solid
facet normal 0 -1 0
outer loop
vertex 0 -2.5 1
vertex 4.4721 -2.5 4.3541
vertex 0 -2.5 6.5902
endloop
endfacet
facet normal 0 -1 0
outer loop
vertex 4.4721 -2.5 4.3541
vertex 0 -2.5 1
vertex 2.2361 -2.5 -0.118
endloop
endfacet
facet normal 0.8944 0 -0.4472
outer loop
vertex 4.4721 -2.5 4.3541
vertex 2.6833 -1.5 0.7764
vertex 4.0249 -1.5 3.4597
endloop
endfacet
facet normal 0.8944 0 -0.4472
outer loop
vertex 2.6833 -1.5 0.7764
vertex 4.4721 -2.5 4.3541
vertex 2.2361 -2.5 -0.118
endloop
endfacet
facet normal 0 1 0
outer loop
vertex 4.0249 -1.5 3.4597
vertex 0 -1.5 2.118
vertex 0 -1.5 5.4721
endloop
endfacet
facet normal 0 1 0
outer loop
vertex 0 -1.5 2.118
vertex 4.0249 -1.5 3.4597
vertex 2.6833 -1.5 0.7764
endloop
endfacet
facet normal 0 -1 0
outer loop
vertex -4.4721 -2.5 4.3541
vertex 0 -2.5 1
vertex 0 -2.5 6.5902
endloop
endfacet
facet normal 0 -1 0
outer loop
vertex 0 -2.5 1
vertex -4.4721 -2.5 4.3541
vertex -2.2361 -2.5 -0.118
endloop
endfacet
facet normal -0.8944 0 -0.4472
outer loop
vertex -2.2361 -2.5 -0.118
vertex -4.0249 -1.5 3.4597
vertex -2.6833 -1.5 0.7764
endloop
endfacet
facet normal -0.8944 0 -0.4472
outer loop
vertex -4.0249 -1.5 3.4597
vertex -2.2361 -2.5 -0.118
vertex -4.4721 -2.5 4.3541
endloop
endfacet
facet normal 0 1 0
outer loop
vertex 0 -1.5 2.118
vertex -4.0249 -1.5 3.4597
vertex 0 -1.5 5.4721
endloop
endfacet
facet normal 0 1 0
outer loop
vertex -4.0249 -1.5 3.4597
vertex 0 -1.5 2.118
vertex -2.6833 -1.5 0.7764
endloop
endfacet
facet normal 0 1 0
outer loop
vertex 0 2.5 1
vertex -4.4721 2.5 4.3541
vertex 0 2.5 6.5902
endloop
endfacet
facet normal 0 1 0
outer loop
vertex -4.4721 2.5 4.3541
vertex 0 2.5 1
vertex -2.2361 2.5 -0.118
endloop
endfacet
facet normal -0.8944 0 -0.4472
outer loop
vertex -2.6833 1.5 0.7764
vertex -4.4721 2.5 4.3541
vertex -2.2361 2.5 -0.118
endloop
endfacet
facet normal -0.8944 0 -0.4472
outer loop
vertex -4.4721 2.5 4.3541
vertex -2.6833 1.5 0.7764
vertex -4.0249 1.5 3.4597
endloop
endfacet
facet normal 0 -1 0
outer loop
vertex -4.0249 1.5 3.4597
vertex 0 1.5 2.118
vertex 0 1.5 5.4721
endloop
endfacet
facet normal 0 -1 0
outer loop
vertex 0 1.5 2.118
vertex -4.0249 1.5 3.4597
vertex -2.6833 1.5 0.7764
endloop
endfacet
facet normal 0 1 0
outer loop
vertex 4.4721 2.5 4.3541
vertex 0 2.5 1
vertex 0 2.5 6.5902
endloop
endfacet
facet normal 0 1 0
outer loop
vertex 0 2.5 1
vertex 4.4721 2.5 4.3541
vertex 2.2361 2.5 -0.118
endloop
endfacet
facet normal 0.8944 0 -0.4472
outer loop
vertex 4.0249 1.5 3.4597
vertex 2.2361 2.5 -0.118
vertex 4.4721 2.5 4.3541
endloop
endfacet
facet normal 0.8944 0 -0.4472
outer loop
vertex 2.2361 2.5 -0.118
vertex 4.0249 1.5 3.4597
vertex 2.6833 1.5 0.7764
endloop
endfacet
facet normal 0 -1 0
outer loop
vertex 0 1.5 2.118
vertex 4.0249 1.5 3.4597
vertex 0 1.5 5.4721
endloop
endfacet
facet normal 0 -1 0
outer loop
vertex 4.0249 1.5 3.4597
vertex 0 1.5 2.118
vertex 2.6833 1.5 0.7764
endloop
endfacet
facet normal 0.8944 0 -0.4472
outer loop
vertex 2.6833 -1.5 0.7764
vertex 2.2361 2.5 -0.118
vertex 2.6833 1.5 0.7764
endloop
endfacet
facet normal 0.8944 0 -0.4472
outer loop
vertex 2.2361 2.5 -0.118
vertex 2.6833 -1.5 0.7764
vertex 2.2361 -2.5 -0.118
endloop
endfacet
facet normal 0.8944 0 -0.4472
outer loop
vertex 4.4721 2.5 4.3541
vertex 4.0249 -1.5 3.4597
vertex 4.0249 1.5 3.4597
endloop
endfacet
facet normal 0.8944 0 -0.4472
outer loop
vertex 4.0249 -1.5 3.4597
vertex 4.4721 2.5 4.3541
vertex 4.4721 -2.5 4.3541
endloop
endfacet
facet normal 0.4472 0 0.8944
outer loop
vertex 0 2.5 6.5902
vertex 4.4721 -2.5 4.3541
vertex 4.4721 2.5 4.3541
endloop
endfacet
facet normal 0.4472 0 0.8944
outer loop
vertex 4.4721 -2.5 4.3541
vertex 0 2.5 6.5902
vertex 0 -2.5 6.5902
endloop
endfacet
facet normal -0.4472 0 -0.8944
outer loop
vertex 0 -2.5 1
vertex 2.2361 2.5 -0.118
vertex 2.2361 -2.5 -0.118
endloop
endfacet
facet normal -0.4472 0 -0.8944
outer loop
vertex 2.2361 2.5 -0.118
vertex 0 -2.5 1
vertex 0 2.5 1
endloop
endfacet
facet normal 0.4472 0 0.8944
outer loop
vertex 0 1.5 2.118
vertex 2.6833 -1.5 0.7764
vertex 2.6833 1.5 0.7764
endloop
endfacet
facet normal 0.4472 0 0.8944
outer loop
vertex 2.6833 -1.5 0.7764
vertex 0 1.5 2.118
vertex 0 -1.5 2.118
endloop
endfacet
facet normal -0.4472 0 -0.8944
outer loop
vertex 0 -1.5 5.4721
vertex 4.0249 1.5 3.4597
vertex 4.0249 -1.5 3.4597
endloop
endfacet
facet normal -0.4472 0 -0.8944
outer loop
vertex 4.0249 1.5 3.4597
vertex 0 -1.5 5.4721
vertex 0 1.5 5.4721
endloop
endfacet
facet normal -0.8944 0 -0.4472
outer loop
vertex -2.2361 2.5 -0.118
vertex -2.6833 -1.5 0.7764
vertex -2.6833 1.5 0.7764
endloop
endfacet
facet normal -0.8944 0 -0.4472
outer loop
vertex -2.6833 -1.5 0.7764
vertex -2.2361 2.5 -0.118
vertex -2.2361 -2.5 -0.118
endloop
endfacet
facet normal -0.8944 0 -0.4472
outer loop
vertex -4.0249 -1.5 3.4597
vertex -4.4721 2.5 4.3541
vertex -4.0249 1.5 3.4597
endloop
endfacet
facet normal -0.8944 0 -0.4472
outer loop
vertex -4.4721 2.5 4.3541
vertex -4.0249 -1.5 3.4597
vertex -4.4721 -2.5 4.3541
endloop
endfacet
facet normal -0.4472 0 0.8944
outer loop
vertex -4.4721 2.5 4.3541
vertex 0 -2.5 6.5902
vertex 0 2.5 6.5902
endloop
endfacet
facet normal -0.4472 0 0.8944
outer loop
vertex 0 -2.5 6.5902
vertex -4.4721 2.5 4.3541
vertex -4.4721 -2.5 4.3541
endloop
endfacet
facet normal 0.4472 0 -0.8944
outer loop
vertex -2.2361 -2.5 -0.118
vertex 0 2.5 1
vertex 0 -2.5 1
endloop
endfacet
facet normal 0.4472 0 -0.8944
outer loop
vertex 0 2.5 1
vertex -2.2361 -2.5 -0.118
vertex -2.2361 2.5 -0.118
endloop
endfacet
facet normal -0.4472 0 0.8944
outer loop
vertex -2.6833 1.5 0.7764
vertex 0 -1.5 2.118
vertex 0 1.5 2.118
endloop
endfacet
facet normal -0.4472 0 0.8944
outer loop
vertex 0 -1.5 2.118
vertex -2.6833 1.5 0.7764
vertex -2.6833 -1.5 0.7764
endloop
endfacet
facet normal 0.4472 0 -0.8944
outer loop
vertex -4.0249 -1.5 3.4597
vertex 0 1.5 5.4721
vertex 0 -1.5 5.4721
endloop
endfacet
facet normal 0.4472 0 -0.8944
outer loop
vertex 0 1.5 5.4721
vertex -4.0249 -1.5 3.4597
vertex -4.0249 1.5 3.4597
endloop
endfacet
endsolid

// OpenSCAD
// file: s/u7041s01.scad
use <../../lib.scad>
function ldraw_lib__s__u7041s01() = [
// 0 ~Modulex Angled Brick 27 2 x 1 Double - Side
// 0 Name: s\u7041s01.dat
// 0 Author: Magnus Forsberg [MagFors]
// 0 !LDRAW_ORG Subpart UPDATE 2025-09
// 0 !LICENSE Licensed under CC BY 4.0 : see CAreadme.txt
// 
// 0 BFC CERTIFY CCW
  [0,"BFC","CERTIFY"],
  [0,"BFC","CCW"],
// 
// 0 !HISTORY 2025-09-29 [OrionP] Official Update 2025-09
// 
// 4 16 0 -16.4754 0 0 -2.499932 0 5.590156 .295115 0 11.180335 -10.885221 0
  [4,16,0,-16.4754,0,0,-2.499932,0,5.590156,.295115,0,11.180335,-10.885221,0],
// 4 16 5.590156 .295115 0 6.708192 -1.940952 2.5 10.062299 -8.649154 2.5 11.180335 -10.885221 0
  [4,16,5.590156,.295115,0,6.708192,-1.940952,2.5,10.062299,-8.649154,2.5,11.180335,-10.885221,0],
// 4 16 0 -5.295055 2.5 0 -13.680314 2.5 10.062299 -8.649154 2.5 6.708192 -1.940952 2.5
  [4,16,0,-5.295055,2.5,0,-13.680314,2.5,10.062299,-8.649154,2.5,6.708192,-1.940952,2.5],
// 2 24 6.708192 -1.940952 2.5 10.062299 -8.649154 2.5
  [2,24,6.708192,-1.940952,2.5,10.062299,-8.649154,2.5],
// 2 24 11.180335 -10.885221 0 5.590156 .295115 0
  [2,24,11.180335,-10.885221,0,5.590156,.295115,0],
// 2 24 5.590156 .295115 0 0 -2.499932 0
  [2,24,5.590156,.295115,0,0,-2.499932,0],
// 2 24 0 -5.295055 2.5 6.708192 -1.940952 2.5
  [2,24,0,-5.295055,2.5,6.708192,-1.940952,2.5],
// 2 24 0 -13.680314 2.5 10.062299 -8.649154 2.5
  [2,24,0,-13.680314,2.5,10.062299,-8.649154,2.5],
// 2 24 0 -16.4754 0 11.180335 -10.885221 0
  [2,24,0,-16.4754,0,11.180335,-10.885221,0],
// 4 16 -5.590156 .295115 0 0 -2.499932 0 0 -16.4754 0 -11.180335 -10.885221 0
  [4,16,-5.590156,.295115,0,0,-2.499932,0,0,-16.4754,0,-11.180335,-10.885221,0],
// 4 16 -10.062299 -8.649154 2.5 -6.708192 -1.940952 2.5 -5.590156 .295115 0 -11.180335 -10.885221 0
  [4,16,-10.062299,-8.649154,2.5,-6.708192,-1.940952,2.5,-5.590156,.295115,0,-11.180335,-10.885221,0],
// 4 16 -10.062299 -8.649154 2.5 0 -13.680314 2.5 0 -5.295055 2.5 -6.708192 -1.940952 2.5
  [4,16,-10.062299,-8.649154,2.5,0,-13.680314,2.5,0,-5.295055,2.5,-6.708192,-1.940952,2.5],
// 2 24 -10.062299 -8.649154 2.5 -6.708192 -1.940952 2.5
  [2,24,-10.062299,-8.649154,2.5,-6.708192,-1.940952,2.5],
// 2 24 -5.590156 .295115 0 -11.180335 -10.885221 0
  [2,24,-5.590156,.295115,0,-11.180335,-10.885221,0],
// 2 24 0 -2.499932 0 -5.590156 .295115 0
  [2,24,0,-2.499932,0,-5.590156,.295115,0],
// 2 24 -6.708192 -1.940952 2.5 0 -5.295055 2.5
  [2,24,-6.708192,-1.940952,2.5,0,-5.295055,2.5],
// 2 24 -10.062299 -8.649154 2.5 0 -13.680314 2.5
  [2,24,-10.062299,-8.649154,2.5,0,-13.680314,2.5],
// 2 24 -11.180335 -10.885221 0 0 -16.4754 0
  [2,24,-11.180335,-10.885221,0,0,-16.4754,0],
];
module ldraw_lib__s__u7041s01(step=0, col=false, unit=2/5, alt=false, line=0.2, solid=!$preview)
    makepoly(ldraw_lib__s__u7041s01(), step=step, col=col, unit=unit, alt=alt, line=line, solid=solid);
ldraw_lib__s__u7041s01(line=0.2);
// main file
use <../lib.scad>
use <s/u7041s01.scad>
function ldraw_lib__u7041() = [
// 0 Modulex Brick Angled 27 2 x 1 Double
// 0 Name: u7041.dat
// 0 Author: Magnus Forsberg [MagFors]
// 0 !LDRAW_ORG Part UPDATE 2025-09
// 0 !LICENSE Licensed under CC BY 4.0 : see CAreadme.txt
// 
// 0 !HELP 1 16 12.5 12.5 0 1 0 0 0 1 0 0 0 1 u7031.dat
// 0 !HELP 1 35 8.385 -5.295 0 0 .894 .447 0 .447 -.894 -1 0 0 u7000.dat
// 
// 0 BFC CERTIFY CCW
  [0,"BFC","CERTIFY"],
  [0,"BFC","CCW"],
// 
// 0 !KEYWORDS 26.5651 degree, Bricklink Mx2402A, Rebrickable 2402A, slope 1:2
// 
// 0 !HISTORY 2025-09-29 [OrionP] Official Update 2025-09
// 
// 1 16 0 0 -6.25 1 0 0 0 1 0 0 0 1 s\u7041s01.dat
  [1,16,0,0,-6.25,1,0,0,0,1,0,0,0,1, ldraw_lib__s__u7041s01()],
// 1 16 0 0 6.25 -1 0 0 0 1 0 0 0 -1 s\u7041s01.dat
  [1,16,0,0,6.25,-1,0,0,0,1,0,0,0,-1, ldraw_lib__s__u7041s01()],
// 
// 2 24 0 -2.499932 6.25 0 -2.499932 -6.25
  [2,24,0,-2.499932,6.25,0,-2.499932,-6.25],
// 2 24 0 -5.295055 3.75 0 -5.295055 -3.75
  [2,24,0,-5.295055,3.75,0,-5.295055,-3.75],
// 2 24 0 -13.680314 -3.75 0 -13.680314 3.75
  [2,24,0,-13.680314,-3.75,0,-13.680314,3.75],
// 2 24 0 -16.4754 -6.25 0 -16.4754 6.25
  [2,24,0,-16.4754,-6.25,0,-16.4754,6.25],
// 
// 4 16 5.590156 .295115 -6.25 5.590156 .295115 6.25 6.708192 -1.940952 3.75 6.708192 -1.940952 -3.75
  [4,16,5.590156,.295115,-6.25,5.590156,.295115,6.25,6.708192,-1.940952,3.75,6.708192,-1.940952,-3.75],
// 4 16 11.180335 -10.885221 -6.25 10.062299 -8.649154 -3.75 10.062299 -8.649154 3.75 11.180335 -10.885221 6.25
  [4,16,11.180335,-10.885221,-6.25,10.062299,-8.649154,-3.75,10.062299,-8.649154,3.75,11.180335,-10.885221,6.25],
// 4 16 11.180335 -10.885221 -6.25 11.180335 -10.885221 6.25 0 -16.4754 6.25 0 -16.4754 -6.25
  [4,16,11.180335,-10.885221,-6.25,11.180335,-10.885221,6.25,0,-16.4754,6.25,0,-16.4754,-6.25],
// 4 16 0 -2.499932 6.25 5.590156 .295115 6.25 5.590156 .295115 -6.25 0 -2.499932 -6.25
  [4,16,0,-2.499932,6.25,5.590156,.295115,6.25,5.590156,.295115,-6.25,0,-2.499932,-6.25],
// 4 16 0 -5.295055 3.75 0 -5.295055 -3.75 6.708192 -1.940952 -3.75 6.708192 -1.940952 3.75
  [4,16,0,-5.295055,3.75,0,-5.295055,-3.75,6.708192,-1.940952,-3.75,6.708192,-1.940952,3.75],
// 4 16 0 -13.680314 3.75 10.062299 -8.649154 3.75 10.062299 -8.649154 -3.75 0 -13.680314 -3.75
  [4,16,0,-13.680314,3.75,10.062299,-8.649154,3.75,10.062299,-8.649154,-3.75,0,-13.680314,-3.75],
// 2 24 11.180335 -10.885221 -6.25 11.180335 -10.885221 6.25
  [2,24,11.180335,-10.885221,-6.25,11.180335,-10.885221,6.25],
// 2 24 10.062299 -8.649154 -3.75 10.062299 -8.649154 3.75
  [2,24,10.062299,-8.649154,-3.75,10.062299,-8.649154,3.75],
// 2 24 5.590156 .295115 -6.25 5.590156 .295115 6.25
  [2,24,5.590156,.295115,-6.25,5.590156,.295115,6.25],
// 2 24 6.708192 -1.940952 3.75 6.708192 -1.940952 -3.75
  [2,24,6.708192,-1.940952,3.75,6.708192,-1.940952,-3.75],
// 
// 4 16 -6.708192 -1.940952 3.75 -5.590156 .295115 6.25 -5.590156 .295115 -6.25 -6.708192 -1.940952 -3.75
  [4,16,-6.708192,-1.940952,3.75,-5.590156,.295115,6.25,-5.590156,.295115,-6.25,-6.708192,-1.940952,-3.75],
// 4 16 -10.062299 -8.649154 3.75 -10.062299 -8.649154 -3.75 -11.180335 -10.885221 -6.25 -11.180335 -10.885221 6.25
  [4,16,-10.062299,-8.649154,3.75,-10.062299,-8.649154,-3.75,-11.180335,-10.885221,-6.25,-11.180335,-10.885221,6.25],
// 4 16 0 -16.4754 6.25 -11.180335 -10.885221 6.25 -11.180335 -10.885221 -6.25 0 -16.4754 -6.25
  [4,16,0,-16.4754,6.25,-11.180335,-10.885221,6.25,-11.180335,-10.885221,-6.25,0,-16.4754,-6.25],
// 4 16 -5.590156 .295115 -6.25 -5.590156 .295115 6.25 0 -2.499932 6.25 0 -2.499932 -6.25
  [4,16,-5.590156,.295115,-6.25,-5.590156,.295115,6.25,0,-2.499932,6.25,0,-2.499932,-6.25],
// 4 16 -6.708192 -1.940952 -3.75 0 -5.295055 -3.75 0 -5.295055 3.75 -6.708192 -1.940952 3.75
  [4,16,-6.708192,-1.940952,-3.75,0,-5.295055,-3.75,0,-5.295055,3.75,-6.708192,-1.940952,3.75],
// 4 16 -10.062299 -8.649154 -3.75 -10.062299 -8.649154 3.75 0 -13.680314 3.75 0 -13.680314 -3.75
  [4,16,-10.062299,-8.649154,-3.75,-10.062299,-8.649154,3.75,0,-13.680314,3.75,0,-13.680314,-3.75],
// 2 24 -11.180335 -10.885221 6.25 -11.180335 -10.885221 -6.25
  [2,24,-11.180335,-10.885221,6.25,-11.180335,-10.885221,-6.25],
// 2 24 -10.062299 -8.649154 3.75 -10.062299 -8.649154 -3.75
  [2,24,-10.062299,-8.649154,3.75,-10.062299,-8.649154,-3.75],
// 2 24 -5.590156 .295115 6.25 -5.590156 .295115 -6.25
  [2,24,-5.590156,.295115,6.25,-5.590156,.295115,-6.25],
// 2 24 -6.708192 -1.940952 -3.75 -6.708192 -1.940952 3.75
  [2,24,-6.708192,-1.940952,-3.75,-6.708192,-1.940952,3.75],
];
module ldraw_lib__u7041(step=0, col=false, unit=2/5, alt=false, line=0.2, solid=!$preview)
    makepoly(ldraw_lib__u7041(), step=step, col=col, unit=unit, alt=alt, line=line, solid=solid);
ldraw_lib__u7041(line=0.2);
